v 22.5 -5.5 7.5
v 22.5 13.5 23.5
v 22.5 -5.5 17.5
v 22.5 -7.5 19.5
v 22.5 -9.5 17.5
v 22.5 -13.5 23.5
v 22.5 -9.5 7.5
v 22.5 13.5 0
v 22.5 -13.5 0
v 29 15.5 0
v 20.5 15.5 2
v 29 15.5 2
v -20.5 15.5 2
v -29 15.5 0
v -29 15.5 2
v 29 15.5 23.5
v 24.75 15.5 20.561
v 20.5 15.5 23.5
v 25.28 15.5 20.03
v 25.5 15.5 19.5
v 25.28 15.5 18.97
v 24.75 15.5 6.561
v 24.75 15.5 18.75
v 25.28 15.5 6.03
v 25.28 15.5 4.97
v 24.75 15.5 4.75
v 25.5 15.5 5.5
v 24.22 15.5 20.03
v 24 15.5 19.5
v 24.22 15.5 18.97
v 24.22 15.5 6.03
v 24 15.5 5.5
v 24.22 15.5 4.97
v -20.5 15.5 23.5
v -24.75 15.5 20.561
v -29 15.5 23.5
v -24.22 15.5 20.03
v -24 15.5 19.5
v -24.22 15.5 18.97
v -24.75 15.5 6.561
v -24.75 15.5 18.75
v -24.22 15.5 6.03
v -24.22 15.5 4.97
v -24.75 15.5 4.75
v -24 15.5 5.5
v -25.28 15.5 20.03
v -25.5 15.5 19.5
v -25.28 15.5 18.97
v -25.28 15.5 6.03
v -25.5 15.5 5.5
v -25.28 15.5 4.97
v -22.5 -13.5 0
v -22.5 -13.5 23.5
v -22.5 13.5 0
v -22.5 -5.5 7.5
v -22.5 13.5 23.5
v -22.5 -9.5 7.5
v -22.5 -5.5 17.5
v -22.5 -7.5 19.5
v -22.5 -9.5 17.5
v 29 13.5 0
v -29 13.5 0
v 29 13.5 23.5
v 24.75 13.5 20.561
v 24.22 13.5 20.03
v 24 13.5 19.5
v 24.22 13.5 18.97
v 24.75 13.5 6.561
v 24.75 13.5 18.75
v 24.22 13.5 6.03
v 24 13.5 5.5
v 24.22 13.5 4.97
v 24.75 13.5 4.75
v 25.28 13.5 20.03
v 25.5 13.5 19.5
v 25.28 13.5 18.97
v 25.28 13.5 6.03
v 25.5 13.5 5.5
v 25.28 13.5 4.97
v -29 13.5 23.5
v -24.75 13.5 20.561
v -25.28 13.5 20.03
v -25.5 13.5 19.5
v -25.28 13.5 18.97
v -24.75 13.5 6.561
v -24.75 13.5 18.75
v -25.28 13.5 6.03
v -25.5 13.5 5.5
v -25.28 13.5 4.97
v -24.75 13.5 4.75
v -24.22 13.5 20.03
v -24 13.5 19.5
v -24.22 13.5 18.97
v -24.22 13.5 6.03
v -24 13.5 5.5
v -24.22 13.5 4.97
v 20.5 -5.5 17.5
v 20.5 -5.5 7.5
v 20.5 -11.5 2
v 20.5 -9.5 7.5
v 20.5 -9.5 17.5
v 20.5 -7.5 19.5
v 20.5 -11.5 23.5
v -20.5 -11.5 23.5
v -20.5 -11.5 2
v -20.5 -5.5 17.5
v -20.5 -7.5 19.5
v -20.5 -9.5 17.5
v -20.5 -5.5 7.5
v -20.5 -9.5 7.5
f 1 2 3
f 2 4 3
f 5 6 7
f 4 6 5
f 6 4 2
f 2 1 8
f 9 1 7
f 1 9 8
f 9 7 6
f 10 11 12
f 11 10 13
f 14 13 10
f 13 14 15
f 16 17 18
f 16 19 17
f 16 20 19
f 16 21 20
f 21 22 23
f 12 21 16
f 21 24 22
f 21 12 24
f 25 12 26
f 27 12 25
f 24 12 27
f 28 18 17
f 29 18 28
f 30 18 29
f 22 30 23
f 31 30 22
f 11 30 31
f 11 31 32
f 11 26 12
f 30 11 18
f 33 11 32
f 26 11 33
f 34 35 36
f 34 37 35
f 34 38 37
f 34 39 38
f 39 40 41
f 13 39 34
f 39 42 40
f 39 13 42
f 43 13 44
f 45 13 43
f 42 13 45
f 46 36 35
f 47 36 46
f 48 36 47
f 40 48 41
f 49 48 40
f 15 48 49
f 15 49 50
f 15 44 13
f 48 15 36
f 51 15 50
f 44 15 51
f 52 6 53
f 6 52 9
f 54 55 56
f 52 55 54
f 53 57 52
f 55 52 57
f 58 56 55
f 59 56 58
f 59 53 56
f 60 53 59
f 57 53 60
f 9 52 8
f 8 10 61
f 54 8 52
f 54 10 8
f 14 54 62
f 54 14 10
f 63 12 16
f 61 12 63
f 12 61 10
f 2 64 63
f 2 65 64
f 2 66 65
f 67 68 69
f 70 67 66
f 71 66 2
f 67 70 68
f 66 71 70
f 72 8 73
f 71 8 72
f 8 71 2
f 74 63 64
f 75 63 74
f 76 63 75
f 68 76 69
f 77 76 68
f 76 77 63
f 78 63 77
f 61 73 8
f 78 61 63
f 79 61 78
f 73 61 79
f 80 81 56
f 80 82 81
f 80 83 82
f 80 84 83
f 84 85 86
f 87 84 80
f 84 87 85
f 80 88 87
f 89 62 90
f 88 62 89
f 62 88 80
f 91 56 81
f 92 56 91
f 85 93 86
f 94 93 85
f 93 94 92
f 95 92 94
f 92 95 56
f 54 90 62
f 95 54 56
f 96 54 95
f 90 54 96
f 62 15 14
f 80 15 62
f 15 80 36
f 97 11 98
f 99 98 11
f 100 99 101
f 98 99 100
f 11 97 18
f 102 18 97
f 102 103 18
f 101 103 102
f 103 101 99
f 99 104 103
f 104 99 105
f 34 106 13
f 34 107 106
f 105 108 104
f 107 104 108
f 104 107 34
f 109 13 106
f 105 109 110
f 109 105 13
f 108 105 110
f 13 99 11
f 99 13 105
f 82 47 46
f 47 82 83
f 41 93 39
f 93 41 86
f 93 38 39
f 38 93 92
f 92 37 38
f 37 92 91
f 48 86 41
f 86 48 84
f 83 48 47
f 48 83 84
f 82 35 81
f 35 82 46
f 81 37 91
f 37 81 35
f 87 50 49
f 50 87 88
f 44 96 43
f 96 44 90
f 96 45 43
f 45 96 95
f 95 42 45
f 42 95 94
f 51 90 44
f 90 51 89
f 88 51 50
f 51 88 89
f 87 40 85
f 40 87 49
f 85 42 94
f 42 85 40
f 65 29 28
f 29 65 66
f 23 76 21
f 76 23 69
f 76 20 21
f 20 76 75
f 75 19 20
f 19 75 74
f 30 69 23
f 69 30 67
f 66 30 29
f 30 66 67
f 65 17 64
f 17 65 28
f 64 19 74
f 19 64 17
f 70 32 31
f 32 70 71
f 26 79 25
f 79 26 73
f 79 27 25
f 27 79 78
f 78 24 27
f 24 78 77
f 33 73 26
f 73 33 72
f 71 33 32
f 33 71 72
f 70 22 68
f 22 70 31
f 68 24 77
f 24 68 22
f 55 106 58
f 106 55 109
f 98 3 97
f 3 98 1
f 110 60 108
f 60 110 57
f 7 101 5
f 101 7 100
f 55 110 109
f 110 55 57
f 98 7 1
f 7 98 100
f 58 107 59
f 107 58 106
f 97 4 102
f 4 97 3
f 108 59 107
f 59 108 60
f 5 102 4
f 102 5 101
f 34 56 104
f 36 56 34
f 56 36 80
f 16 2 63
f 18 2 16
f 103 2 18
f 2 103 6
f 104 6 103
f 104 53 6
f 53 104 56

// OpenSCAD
overallheight = 50;
servoheight = 36;
servowidth = 21;
servolength = 41;
servoholepitch = 14;
servoholediam  = 3;
flangeheight = 27;
overalllength = 58; 
flangethickness = 3;
flangelength = (overalllength-servolength)/2;
pocketwallthickness=2;
socketwidth = 10;
socketheight = 2;
socketthickness = 4;
d1=10;	// Extra offset when preventing coincident surfaces
d2=20;	// Extra length to prevent coincident surfaces

// Standing cube: cube stands on z=0, centred over x- and y- axes
module standingcube(x, y, z)
{
	translate([0,0,z/2]) cube([x,y,z], center=true);
}

// Standing cube with pointy hat: 
// cube stands on z=0, centred over x- and y- axes, 
// with negative y-facing edge extended to a 45 degree point aligned with the z axis
module standingcubehatz(x, y, z)
{
	hatsize = x/sqrt(2);
	translate([0,0,z/2])
		union()
		{
			cube([x,y,z], center=true);
			translate([0,-y/2,0]) rotate([0,0,45]) cube([hatsize,hatsize,z], center=true);
		}
}

// Standing cube with pointy hat: 
// cube stands on z=0, centred over x- and y- axes, 
// with negative y-facing edge extended to a 45 degree point aligned with the x axis
module standingcubehatx(x, y, z)
{
	hatsize = z/sqrt(2);
	translate([0,0,z/2])
		union()
		{
			cube([x,y,z], center=true);
			translate([0,-y/2,0]) rotate([0,90,0]) rotate([0,0,45]) cube([hatsize,hatsize,x], center=true);
		}
}

// Teardrop: height, radius
// like basic non-centred cylinder, but with 45 degree point in -y direction
module teardrop(h, r)
{
	union()
	{
		cylinder(h=h, r=r, $fn=8);
		translate([0,-r/sqrt(2),0]) rotate([0,0,45]) standingcube(r, r, h);
	}
}


// Servoholes: length, hole pitch, height, flange length, hole diameter
// @@TODO use reprap teardrop shape
module servoholes(sl, hp, sh, fl, hd)
{
    xo = (sl+fl)/2;
	yo = hp/2;
	for (x = [-xo,xo])
	{
		for (y = [-yo,yo])
		{
			translate([x,y,0]) 
				//cylinder(h=sh,r=hd/2);
				teardrop(sh,hd/2);
		}
	}
	
}

// Servo outline: length, width, height, flange length, flange height, flange thickness
module servooutline(l, w, h, fl, fh, ft)
{
    union()
        {
            standingcube(l, w, h);
            translate([0,0,fh]) standingcube(l+2*fl, w, ft);
        }
}

// Servo: length, width, height, flange length, flange height, flange thickness, hole pitch, hole diameter
module servo(sl, sw, sh, fl, fh, ft, hp, hd)
{
    difference()
        {
            servooutline(sl, sw, sh, fl, fh, ft);
            servoholes(sl, hp, sh, fl, hd);
        }
}

// Cutout:  servo length, servo width, overall height, flange length, flange height, wall thickness
module servocutout(sl, sw, oh, fl, fh, wt)
{
    union()
        {
            standingcube(sl+(wt*2), sw+(wt*2), oh+wt);
            translate([0,0,fh]) standingcube(sl+2*fl, sw+(wt*2), oh+wt-fh);
        }	
}

// Socket hole: servo length, socket width, socket thickness, socket height
//@@TODO make pointy end for reprap printing
module sockethole(sl, sw, st, sh)
{
	translate([0, 0, sh]) standingcubehatx(sl, sw, st);
}

// Pocket: servo length, servo width, flange length, flange height, wall thickness, 
//         hole pitch, hole diameter,
//         socketwidth, socketthickness, socketheight
module servopocket(sl, sw, fl, fh, ft, wt, hp, hd, skw, skt, skh)
{
	difference()
	{
		servocutout(sl,sw,fh,fl,fh,wt);
		translate([0, -d1, wt])
			servooutline(sl,sw+d2,fh+ft+d2,fl,fh,ft);
		servoholes(sl,hp,fh+ft+d2,fl,hd);
		sockethole(sl+d2,skw,skt,skh+wt);
        translate([0,-sw,0])
			standingcube(sl+d2, d2, fh+ft+d2);
	}
}


//standingcubehatz(10,30,50);
//standingcubehatx(50,30,10);
//teardrop(10, 15);
//servoholes(servolength,servoholepitch,servoheight,flangelength,servoholediam);
//servooutline(servolength,servowidth,servoheight,flangelength,flangeheight,flangethickness);
//servo(servolength,servowidth,servoheight,flangelength,flangeheight,flangethickness,servoholepitch,servoholediam);
//servocutout(servolength,servowidth,overallheight,flangelength,flangeheight,pocketwallthickness);
//sockethole(servolength+d2,socketwidth,socketthickness,socketheight+pocketwallthickness);
//servopocket(servolength, servowidth, flangelength, flangeheight, flangethickness,
//            pocketwallthickness, 
//            servoholepitch, servoholediam/2,
//            socketwidth, socketthickness, socketheight);


// Servo pocket oriented for printing
rotate([-90,0,0])
	translate([0,-(servowidth/2+pocketwallthickness),-flangeheight/2])
		servopocket(servolength, servowidth, flangelength, flangeheight, flangethickness,
		            pocketwallthickness, 
		            servoholepitch, servoholediam/2,
		            socketwidth, socketthickness, socketheight);

// ----------------------------------------------
